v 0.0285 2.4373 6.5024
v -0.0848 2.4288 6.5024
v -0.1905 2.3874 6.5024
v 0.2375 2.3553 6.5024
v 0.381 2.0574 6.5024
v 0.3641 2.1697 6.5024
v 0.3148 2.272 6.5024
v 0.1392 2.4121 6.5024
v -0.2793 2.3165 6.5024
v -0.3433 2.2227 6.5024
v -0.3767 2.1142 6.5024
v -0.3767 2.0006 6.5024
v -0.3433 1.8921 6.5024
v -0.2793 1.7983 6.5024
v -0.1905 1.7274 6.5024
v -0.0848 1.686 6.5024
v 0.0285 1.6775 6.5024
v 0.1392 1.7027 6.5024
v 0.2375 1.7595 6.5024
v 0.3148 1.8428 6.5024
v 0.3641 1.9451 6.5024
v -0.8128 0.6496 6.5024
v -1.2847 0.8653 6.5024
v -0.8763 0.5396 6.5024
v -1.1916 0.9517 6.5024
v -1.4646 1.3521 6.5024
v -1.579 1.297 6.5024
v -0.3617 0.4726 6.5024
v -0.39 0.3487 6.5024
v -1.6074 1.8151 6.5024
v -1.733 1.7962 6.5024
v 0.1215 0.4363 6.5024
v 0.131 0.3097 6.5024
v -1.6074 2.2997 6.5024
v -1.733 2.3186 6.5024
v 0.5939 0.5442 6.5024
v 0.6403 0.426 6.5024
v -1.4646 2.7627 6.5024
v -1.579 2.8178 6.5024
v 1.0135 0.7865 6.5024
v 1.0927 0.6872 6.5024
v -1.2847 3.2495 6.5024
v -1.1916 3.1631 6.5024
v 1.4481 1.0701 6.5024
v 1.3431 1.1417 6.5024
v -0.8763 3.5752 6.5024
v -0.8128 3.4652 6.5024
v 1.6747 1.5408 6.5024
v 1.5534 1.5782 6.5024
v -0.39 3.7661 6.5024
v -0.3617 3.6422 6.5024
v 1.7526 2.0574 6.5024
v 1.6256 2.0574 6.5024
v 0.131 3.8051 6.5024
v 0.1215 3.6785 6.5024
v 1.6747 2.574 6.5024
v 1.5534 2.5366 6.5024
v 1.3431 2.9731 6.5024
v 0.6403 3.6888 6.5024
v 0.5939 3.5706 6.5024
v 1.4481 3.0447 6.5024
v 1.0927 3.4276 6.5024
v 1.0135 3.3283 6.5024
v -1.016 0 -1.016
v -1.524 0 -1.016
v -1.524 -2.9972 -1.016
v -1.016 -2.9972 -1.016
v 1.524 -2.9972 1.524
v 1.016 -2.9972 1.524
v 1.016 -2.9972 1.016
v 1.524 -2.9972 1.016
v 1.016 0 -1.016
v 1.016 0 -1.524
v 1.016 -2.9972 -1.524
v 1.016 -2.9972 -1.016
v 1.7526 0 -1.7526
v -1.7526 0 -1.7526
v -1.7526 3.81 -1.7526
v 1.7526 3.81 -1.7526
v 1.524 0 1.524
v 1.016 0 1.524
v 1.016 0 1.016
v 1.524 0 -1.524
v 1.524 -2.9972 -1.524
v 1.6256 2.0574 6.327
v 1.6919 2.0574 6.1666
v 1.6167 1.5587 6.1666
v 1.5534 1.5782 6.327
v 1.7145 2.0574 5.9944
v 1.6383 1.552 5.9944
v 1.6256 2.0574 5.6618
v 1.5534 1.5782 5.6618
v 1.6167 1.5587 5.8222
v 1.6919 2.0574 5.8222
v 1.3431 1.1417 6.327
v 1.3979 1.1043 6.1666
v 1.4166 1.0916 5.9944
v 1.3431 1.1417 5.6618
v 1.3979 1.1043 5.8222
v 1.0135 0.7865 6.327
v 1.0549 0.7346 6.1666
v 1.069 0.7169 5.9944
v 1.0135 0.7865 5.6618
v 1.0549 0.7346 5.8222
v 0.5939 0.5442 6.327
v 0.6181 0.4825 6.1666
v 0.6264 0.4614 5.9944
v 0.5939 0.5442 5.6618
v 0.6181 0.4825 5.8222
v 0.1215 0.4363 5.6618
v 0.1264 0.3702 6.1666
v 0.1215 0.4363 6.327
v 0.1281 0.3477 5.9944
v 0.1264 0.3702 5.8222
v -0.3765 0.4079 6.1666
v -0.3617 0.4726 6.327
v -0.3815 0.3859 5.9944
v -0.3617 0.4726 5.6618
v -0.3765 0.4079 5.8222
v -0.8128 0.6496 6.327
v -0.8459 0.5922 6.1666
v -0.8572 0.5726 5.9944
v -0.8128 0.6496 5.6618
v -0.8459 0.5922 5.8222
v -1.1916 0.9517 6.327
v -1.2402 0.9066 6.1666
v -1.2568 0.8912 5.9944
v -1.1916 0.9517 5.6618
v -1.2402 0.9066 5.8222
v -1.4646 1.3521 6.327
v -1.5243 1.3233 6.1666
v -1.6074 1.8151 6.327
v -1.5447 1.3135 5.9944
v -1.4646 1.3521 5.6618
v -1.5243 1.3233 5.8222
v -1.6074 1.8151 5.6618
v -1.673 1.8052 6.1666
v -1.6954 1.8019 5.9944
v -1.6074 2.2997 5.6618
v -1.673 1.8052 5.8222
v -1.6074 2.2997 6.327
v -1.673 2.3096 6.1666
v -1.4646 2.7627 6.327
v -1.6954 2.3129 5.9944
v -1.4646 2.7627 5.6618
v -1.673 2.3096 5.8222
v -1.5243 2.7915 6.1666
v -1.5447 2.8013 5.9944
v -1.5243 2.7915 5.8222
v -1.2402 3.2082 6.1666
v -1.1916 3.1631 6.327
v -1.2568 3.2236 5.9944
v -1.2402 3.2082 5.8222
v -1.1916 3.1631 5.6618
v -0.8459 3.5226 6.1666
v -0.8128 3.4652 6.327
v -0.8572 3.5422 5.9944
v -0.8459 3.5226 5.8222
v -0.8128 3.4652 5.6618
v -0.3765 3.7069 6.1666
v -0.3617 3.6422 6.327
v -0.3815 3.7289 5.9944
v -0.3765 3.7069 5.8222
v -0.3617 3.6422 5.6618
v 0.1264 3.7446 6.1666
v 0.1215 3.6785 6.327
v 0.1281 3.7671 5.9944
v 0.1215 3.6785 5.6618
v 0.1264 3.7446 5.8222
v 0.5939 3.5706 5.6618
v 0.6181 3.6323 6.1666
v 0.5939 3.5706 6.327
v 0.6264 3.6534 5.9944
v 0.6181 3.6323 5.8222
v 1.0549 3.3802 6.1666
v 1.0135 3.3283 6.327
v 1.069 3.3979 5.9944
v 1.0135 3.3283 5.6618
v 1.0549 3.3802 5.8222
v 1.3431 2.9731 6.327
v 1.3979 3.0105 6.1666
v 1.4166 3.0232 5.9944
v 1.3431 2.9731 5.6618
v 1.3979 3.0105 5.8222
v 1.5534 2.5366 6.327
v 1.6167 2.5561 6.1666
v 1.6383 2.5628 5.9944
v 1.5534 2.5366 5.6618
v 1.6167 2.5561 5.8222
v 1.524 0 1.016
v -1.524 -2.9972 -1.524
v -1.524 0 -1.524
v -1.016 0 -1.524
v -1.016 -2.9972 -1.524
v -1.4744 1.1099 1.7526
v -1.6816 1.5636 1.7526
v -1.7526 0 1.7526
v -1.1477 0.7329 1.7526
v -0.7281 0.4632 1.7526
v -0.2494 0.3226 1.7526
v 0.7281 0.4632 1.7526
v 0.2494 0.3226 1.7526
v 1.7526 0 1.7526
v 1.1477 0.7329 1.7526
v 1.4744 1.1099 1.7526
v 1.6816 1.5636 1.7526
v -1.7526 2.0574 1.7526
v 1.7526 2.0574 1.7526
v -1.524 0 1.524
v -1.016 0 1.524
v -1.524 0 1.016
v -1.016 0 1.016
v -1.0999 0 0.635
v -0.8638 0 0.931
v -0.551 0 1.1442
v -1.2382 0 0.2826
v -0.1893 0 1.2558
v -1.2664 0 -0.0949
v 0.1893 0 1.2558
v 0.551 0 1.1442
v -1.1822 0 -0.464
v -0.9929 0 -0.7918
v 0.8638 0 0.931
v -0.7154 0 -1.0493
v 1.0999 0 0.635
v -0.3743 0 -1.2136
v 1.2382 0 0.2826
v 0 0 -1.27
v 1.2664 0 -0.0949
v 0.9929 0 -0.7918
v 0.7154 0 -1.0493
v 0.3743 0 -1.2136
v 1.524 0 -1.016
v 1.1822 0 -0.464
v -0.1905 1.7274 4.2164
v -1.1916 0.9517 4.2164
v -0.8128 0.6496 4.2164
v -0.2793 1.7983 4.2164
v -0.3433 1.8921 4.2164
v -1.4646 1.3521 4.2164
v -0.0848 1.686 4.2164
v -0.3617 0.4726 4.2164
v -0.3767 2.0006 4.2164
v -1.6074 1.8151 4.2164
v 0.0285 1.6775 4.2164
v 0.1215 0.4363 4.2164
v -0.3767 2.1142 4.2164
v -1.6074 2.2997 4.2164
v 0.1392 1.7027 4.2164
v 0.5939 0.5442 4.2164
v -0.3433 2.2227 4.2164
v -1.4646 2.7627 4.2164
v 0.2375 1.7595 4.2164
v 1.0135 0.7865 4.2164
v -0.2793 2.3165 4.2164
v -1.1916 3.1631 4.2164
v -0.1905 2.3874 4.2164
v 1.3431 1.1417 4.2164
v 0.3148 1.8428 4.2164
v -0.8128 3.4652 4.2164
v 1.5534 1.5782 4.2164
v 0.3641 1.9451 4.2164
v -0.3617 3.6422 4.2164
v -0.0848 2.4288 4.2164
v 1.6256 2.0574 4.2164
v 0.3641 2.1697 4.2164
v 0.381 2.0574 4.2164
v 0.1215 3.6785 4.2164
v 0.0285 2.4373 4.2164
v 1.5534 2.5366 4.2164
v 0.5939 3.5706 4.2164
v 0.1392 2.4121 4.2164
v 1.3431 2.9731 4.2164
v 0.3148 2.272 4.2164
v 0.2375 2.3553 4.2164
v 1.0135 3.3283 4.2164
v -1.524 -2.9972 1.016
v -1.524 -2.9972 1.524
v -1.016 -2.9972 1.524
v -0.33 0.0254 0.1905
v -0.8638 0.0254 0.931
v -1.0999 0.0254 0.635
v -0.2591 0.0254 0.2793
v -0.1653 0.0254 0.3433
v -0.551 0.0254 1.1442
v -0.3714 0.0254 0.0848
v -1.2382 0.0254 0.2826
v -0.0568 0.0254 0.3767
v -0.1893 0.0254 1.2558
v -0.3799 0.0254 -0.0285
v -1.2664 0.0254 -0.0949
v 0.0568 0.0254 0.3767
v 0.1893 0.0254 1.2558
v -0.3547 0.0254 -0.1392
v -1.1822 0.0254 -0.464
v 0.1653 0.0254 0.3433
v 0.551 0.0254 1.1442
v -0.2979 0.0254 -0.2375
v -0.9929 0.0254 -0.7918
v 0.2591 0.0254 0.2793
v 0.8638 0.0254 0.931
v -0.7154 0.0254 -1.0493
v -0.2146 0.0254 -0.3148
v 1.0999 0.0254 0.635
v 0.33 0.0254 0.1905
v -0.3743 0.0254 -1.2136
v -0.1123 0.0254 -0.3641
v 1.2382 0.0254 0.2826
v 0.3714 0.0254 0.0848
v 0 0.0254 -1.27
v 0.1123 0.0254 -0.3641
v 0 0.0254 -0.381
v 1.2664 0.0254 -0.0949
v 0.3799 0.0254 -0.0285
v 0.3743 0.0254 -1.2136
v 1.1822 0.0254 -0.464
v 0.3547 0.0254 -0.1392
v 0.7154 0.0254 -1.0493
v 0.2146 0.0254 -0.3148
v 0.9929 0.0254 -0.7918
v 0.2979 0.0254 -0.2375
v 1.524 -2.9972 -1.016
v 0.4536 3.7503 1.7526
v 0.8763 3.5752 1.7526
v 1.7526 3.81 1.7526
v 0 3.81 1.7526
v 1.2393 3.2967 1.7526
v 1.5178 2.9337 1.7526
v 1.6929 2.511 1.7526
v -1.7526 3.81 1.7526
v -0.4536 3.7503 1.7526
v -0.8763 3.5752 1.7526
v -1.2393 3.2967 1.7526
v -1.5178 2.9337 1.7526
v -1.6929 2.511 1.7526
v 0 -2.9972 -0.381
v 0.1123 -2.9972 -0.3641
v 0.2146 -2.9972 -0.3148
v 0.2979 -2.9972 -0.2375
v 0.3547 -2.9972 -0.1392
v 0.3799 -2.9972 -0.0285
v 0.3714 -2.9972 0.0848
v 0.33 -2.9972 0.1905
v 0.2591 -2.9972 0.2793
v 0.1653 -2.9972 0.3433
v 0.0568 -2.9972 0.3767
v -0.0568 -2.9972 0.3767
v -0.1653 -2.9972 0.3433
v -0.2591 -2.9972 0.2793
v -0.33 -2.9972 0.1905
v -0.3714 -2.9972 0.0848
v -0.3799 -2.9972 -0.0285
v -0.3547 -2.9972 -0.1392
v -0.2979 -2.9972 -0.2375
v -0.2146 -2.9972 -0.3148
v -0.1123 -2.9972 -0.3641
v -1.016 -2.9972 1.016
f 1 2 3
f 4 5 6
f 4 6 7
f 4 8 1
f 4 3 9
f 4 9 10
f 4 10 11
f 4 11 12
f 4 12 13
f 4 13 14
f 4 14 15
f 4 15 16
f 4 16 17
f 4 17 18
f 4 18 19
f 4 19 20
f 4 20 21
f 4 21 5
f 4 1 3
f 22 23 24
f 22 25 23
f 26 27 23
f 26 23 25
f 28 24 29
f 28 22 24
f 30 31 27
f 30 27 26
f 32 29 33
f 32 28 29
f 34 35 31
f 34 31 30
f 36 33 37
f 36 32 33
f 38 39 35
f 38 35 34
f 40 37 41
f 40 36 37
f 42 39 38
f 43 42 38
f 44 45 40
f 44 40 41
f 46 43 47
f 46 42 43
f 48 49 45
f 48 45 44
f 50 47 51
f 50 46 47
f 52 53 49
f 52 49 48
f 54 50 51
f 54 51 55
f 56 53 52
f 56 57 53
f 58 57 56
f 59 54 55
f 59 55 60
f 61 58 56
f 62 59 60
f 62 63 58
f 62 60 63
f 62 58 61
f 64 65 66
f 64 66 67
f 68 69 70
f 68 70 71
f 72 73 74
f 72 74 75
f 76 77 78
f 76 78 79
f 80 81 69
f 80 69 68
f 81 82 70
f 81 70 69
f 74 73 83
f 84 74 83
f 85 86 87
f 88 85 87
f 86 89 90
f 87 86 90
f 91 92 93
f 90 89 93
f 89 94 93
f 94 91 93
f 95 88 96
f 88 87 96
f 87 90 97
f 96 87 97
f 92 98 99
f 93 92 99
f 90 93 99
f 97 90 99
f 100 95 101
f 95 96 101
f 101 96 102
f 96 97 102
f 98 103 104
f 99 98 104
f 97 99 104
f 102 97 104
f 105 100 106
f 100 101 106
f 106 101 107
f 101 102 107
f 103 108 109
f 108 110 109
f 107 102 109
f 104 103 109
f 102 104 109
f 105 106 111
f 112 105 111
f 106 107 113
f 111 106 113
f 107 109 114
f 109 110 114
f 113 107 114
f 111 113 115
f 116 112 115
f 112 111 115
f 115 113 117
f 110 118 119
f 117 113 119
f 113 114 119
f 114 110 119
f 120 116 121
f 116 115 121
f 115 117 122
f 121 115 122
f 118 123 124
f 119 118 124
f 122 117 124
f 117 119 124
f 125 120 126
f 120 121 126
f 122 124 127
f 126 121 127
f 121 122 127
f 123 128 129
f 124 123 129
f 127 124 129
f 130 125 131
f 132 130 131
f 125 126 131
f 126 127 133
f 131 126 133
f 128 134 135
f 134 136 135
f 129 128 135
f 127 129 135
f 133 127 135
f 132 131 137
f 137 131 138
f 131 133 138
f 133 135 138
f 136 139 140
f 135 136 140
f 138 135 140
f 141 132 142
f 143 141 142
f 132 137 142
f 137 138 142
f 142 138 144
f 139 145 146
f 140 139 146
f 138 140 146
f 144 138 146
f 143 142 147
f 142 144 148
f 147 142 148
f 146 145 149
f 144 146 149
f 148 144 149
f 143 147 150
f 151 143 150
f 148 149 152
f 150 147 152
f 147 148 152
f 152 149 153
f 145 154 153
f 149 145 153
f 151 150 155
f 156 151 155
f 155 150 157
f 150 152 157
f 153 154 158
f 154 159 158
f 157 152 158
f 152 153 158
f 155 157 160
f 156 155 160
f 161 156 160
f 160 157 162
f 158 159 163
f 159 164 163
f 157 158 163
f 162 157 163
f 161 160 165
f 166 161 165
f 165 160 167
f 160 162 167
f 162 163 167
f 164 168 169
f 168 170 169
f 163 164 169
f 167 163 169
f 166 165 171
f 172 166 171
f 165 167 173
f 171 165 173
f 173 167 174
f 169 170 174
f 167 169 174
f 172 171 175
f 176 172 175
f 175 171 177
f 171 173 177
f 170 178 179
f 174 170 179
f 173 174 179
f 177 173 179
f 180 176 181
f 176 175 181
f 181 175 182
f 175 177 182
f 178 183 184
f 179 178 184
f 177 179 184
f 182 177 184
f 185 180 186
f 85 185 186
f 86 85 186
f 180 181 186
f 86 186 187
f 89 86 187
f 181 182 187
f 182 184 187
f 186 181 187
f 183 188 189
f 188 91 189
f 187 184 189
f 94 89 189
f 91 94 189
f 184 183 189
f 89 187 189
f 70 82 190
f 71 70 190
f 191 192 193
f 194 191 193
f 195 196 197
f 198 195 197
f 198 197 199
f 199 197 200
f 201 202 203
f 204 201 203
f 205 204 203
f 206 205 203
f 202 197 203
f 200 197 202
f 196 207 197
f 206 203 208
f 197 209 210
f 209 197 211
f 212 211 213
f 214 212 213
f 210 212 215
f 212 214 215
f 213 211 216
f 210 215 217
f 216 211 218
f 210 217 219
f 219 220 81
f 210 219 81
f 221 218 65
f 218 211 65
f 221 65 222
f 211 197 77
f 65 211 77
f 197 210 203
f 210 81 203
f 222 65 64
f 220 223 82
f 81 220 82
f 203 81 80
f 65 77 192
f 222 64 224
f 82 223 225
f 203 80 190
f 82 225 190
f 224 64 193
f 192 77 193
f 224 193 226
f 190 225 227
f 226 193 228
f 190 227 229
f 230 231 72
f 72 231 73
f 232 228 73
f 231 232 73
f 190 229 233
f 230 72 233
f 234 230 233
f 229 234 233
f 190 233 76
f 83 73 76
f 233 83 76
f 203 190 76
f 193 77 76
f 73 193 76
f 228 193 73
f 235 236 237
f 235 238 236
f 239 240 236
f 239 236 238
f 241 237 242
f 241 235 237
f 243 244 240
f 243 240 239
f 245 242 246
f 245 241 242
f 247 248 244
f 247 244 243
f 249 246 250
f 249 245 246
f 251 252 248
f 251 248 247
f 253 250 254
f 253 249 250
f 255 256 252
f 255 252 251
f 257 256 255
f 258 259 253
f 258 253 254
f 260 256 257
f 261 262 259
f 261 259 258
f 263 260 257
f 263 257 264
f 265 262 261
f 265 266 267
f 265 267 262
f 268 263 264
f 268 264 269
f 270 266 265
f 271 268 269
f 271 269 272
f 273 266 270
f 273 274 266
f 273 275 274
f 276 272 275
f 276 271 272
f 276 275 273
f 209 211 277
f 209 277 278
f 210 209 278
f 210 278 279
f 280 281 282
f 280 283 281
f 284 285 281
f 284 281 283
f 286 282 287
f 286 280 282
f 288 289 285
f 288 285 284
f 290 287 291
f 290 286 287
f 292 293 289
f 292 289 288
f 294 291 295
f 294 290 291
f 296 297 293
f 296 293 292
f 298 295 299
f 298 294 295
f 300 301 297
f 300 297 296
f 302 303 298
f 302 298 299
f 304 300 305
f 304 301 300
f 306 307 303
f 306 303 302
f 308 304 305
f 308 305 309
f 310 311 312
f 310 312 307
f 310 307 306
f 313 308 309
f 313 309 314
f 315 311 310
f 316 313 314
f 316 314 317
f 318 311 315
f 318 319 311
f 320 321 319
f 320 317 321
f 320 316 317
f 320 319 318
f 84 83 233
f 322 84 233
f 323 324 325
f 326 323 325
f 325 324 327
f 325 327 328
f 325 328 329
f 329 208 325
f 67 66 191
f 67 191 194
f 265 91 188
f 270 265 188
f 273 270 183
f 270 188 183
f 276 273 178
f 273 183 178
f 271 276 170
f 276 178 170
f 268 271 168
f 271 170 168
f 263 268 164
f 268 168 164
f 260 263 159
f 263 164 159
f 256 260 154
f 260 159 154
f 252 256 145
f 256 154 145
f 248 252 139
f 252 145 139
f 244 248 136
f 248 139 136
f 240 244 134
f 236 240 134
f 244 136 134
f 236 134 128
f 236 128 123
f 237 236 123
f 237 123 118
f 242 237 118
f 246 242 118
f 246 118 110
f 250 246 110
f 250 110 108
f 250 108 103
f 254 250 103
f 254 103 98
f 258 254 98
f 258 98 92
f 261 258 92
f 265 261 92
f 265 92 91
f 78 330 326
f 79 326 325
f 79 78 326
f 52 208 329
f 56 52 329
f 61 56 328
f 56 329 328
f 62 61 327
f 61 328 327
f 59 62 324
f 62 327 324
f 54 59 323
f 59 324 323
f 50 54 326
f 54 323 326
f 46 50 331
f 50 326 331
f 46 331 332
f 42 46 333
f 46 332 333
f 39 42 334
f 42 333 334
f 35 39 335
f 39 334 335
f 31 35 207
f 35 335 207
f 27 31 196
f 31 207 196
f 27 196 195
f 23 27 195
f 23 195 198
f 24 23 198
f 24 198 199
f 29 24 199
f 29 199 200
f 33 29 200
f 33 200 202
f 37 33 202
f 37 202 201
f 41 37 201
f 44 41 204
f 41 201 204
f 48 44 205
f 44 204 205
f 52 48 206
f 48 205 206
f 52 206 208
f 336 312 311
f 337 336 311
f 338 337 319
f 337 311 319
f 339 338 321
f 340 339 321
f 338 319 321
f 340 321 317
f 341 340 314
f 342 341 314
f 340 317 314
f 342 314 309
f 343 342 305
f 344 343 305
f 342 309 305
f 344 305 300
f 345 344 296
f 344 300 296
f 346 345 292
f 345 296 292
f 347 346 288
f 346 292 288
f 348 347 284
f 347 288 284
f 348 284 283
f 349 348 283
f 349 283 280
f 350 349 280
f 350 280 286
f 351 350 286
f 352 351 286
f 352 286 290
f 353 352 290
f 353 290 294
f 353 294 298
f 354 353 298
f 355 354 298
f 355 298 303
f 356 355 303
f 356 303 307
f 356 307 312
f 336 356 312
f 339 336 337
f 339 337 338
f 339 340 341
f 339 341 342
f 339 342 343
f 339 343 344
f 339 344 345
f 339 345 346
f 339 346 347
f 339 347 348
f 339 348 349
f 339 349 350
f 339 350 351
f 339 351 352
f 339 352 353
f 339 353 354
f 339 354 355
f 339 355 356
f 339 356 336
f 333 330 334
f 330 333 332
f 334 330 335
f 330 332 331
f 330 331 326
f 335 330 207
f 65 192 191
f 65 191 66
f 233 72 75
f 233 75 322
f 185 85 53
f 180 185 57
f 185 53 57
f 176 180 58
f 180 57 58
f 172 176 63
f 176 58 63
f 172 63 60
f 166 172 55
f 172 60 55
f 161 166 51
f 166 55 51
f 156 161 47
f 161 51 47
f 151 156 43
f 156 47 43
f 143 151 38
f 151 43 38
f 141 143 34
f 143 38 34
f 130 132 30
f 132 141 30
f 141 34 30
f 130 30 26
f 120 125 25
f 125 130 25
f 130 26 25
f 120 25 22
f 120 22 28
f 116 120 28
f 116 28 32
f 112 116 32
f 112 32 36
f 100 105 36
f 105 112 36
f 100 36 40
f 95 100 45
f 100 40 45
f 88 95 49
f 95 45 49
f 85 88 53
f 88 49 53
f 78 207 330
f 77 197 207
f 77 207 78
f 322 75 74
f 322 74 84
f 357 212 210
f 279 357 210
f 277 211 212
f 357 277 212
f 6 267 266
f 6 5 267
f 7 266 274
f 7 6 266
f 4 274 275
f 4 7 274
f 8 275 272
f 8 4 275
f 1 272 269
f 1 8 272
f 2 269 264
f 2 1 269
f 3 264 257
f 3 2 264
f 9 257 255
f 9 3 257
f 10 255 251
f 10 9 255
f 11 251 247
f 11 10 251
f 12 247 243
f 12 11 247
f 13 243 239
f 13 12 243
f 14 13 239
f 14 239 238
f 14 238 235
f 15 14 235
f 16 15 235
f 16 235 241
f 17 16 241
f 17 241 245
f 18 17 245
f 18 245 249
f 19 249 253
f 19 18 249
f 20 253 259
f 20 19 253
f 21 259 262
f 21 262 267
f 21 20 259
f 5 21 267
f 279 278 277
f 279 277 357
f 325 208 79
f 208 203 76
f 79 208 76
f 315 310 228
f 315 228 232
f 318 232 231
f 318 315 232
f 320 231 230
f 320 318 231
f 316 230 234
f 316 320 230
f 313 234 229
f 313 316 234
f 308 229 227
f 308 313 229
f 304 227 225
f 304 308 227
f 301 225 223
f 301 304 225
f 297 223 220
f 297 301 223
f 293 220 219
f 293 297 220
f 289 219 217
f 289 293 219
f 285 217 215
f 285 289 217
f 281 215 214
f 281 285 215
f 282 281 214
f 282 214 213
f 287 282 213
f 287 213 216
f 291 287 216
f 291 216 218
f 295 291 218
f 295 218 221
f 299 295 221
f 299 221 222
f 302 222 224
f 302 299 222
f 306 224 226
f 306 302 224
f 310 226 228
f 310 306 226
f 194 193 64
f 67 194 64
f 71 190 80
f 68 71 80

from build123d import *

# Parameters (mm, degrees)
SKETCH1_W           = 3.5052
SKETCH1_H           = 3.5052
BOSS_EXTRUDE1_DEPTH = 3.81
SKETCH2_R           = 1.7526
BOSS_EXTRUDE2_DEPTH = 4.7498
SKETCH3_R           = 0.381
SKETCH3_W           = 0.508
SKETCH3_H           = 0.508
BOSS_EXTRUDE3_DEPTH = 2.9972
CUT_EXTRUDE2_START  = -0.0254
SKETCH4_R           = 1.27
SKETCH4_R_2         = 0.381
CUT_EXTRUDE2_DEPTH  = 0.0254
SKETCH5_R           = 1.6256
SKETCH5_R_2         = 0.381
CUT_EXTRUDE3_DEPTH  = 2.286
SKETCH6_R           = 0.66675


with BuildPart() as part:
    # Sketch1 → Boss-Extrude1 (new body)
    with BuildSketch(Plane(origin=(0, 0, 0), x_dir=(1, 0, 0), z_dir=(0, 1, 0))):
        Rectangle(SKETCH1_W, SKETCH1_H)
    extrude(amount=BOSS_EXTRUDE1_DEPTH)

    # Sketch2 → Boss-Extrude2 (add)
    with BuildSketch(Plane.XY.offset(1.7526)):
        with Locations((0, 2.0574)):
            Circle(SKETCH2_R)
    extrude(amount=BOSS_EXTRUDE2_DEPTH)

    # Sketch3 → Boss-Extrude3 (add)
    with BuildSketch(Plane.XZ):
        Circle(SKETCH3_R)
        with Locations((-1.27, 1.27)):
            Rectangle(SKETCH3_W, SKETCH3_H)
        with Locations((1.27, 1.27)):
            Rectangle(SKETCH3_W, SKETCH3_H)
        with Locations((-1.27, -1.27)):
            Rectangle(SKETCH3_W, SKETCH3_H)
        with Locations((1.27, -1.27)):
            Rectangle(SKETCH3_W, SKETCH3_H)
    extrude(amount=BOSS_EXTRUDE3_DEPTH)

    # Sketch4 → Cut-Extrude2 (cut)
    with BuildSketch(Plane.XZ.offset(CUT_EXTRUDE2_START)):
        Circle(SKETCH4_R)
        Circle(SKETCH4_R_2, mode=Mode.SUBTRACT)
    extrude(amount=CUT_EXTRUDE2_DEPTH, mode=Mode.SUBTRACT)

    # Sketch5 → Cut-Extrude3 (cut)
    with BuildSketch(Plane.XY.offset(6.5024)):
        with Locations((0, 2.0574)):
            Circle(SKETCH5_R)
        with Locations((0, 2.0574)):
            Circle(SKETCH5_R_2, mode=Mode.SUBTRACT)
    extrude(amount=-CUT_EXTRUDE3_DEPTH, mode=Mode.SUBTRACT)

    # Sketch6 → Cut-Revolve1 (revolve, cut)
    with BuildSketch(Plane(origin=(0, 0, 0), x_dir=(0, 0, -1), z_dir=(1, 0, 0))):
        with Locations((-5.9944, 1.00965)):
            Circle(SKETCH6_R)
    revolve(axis=Axis((0, 2.0574, 9.059220752), (0, 0, -1)), mode=Mode.SUBTRACT)


solid = part.part
